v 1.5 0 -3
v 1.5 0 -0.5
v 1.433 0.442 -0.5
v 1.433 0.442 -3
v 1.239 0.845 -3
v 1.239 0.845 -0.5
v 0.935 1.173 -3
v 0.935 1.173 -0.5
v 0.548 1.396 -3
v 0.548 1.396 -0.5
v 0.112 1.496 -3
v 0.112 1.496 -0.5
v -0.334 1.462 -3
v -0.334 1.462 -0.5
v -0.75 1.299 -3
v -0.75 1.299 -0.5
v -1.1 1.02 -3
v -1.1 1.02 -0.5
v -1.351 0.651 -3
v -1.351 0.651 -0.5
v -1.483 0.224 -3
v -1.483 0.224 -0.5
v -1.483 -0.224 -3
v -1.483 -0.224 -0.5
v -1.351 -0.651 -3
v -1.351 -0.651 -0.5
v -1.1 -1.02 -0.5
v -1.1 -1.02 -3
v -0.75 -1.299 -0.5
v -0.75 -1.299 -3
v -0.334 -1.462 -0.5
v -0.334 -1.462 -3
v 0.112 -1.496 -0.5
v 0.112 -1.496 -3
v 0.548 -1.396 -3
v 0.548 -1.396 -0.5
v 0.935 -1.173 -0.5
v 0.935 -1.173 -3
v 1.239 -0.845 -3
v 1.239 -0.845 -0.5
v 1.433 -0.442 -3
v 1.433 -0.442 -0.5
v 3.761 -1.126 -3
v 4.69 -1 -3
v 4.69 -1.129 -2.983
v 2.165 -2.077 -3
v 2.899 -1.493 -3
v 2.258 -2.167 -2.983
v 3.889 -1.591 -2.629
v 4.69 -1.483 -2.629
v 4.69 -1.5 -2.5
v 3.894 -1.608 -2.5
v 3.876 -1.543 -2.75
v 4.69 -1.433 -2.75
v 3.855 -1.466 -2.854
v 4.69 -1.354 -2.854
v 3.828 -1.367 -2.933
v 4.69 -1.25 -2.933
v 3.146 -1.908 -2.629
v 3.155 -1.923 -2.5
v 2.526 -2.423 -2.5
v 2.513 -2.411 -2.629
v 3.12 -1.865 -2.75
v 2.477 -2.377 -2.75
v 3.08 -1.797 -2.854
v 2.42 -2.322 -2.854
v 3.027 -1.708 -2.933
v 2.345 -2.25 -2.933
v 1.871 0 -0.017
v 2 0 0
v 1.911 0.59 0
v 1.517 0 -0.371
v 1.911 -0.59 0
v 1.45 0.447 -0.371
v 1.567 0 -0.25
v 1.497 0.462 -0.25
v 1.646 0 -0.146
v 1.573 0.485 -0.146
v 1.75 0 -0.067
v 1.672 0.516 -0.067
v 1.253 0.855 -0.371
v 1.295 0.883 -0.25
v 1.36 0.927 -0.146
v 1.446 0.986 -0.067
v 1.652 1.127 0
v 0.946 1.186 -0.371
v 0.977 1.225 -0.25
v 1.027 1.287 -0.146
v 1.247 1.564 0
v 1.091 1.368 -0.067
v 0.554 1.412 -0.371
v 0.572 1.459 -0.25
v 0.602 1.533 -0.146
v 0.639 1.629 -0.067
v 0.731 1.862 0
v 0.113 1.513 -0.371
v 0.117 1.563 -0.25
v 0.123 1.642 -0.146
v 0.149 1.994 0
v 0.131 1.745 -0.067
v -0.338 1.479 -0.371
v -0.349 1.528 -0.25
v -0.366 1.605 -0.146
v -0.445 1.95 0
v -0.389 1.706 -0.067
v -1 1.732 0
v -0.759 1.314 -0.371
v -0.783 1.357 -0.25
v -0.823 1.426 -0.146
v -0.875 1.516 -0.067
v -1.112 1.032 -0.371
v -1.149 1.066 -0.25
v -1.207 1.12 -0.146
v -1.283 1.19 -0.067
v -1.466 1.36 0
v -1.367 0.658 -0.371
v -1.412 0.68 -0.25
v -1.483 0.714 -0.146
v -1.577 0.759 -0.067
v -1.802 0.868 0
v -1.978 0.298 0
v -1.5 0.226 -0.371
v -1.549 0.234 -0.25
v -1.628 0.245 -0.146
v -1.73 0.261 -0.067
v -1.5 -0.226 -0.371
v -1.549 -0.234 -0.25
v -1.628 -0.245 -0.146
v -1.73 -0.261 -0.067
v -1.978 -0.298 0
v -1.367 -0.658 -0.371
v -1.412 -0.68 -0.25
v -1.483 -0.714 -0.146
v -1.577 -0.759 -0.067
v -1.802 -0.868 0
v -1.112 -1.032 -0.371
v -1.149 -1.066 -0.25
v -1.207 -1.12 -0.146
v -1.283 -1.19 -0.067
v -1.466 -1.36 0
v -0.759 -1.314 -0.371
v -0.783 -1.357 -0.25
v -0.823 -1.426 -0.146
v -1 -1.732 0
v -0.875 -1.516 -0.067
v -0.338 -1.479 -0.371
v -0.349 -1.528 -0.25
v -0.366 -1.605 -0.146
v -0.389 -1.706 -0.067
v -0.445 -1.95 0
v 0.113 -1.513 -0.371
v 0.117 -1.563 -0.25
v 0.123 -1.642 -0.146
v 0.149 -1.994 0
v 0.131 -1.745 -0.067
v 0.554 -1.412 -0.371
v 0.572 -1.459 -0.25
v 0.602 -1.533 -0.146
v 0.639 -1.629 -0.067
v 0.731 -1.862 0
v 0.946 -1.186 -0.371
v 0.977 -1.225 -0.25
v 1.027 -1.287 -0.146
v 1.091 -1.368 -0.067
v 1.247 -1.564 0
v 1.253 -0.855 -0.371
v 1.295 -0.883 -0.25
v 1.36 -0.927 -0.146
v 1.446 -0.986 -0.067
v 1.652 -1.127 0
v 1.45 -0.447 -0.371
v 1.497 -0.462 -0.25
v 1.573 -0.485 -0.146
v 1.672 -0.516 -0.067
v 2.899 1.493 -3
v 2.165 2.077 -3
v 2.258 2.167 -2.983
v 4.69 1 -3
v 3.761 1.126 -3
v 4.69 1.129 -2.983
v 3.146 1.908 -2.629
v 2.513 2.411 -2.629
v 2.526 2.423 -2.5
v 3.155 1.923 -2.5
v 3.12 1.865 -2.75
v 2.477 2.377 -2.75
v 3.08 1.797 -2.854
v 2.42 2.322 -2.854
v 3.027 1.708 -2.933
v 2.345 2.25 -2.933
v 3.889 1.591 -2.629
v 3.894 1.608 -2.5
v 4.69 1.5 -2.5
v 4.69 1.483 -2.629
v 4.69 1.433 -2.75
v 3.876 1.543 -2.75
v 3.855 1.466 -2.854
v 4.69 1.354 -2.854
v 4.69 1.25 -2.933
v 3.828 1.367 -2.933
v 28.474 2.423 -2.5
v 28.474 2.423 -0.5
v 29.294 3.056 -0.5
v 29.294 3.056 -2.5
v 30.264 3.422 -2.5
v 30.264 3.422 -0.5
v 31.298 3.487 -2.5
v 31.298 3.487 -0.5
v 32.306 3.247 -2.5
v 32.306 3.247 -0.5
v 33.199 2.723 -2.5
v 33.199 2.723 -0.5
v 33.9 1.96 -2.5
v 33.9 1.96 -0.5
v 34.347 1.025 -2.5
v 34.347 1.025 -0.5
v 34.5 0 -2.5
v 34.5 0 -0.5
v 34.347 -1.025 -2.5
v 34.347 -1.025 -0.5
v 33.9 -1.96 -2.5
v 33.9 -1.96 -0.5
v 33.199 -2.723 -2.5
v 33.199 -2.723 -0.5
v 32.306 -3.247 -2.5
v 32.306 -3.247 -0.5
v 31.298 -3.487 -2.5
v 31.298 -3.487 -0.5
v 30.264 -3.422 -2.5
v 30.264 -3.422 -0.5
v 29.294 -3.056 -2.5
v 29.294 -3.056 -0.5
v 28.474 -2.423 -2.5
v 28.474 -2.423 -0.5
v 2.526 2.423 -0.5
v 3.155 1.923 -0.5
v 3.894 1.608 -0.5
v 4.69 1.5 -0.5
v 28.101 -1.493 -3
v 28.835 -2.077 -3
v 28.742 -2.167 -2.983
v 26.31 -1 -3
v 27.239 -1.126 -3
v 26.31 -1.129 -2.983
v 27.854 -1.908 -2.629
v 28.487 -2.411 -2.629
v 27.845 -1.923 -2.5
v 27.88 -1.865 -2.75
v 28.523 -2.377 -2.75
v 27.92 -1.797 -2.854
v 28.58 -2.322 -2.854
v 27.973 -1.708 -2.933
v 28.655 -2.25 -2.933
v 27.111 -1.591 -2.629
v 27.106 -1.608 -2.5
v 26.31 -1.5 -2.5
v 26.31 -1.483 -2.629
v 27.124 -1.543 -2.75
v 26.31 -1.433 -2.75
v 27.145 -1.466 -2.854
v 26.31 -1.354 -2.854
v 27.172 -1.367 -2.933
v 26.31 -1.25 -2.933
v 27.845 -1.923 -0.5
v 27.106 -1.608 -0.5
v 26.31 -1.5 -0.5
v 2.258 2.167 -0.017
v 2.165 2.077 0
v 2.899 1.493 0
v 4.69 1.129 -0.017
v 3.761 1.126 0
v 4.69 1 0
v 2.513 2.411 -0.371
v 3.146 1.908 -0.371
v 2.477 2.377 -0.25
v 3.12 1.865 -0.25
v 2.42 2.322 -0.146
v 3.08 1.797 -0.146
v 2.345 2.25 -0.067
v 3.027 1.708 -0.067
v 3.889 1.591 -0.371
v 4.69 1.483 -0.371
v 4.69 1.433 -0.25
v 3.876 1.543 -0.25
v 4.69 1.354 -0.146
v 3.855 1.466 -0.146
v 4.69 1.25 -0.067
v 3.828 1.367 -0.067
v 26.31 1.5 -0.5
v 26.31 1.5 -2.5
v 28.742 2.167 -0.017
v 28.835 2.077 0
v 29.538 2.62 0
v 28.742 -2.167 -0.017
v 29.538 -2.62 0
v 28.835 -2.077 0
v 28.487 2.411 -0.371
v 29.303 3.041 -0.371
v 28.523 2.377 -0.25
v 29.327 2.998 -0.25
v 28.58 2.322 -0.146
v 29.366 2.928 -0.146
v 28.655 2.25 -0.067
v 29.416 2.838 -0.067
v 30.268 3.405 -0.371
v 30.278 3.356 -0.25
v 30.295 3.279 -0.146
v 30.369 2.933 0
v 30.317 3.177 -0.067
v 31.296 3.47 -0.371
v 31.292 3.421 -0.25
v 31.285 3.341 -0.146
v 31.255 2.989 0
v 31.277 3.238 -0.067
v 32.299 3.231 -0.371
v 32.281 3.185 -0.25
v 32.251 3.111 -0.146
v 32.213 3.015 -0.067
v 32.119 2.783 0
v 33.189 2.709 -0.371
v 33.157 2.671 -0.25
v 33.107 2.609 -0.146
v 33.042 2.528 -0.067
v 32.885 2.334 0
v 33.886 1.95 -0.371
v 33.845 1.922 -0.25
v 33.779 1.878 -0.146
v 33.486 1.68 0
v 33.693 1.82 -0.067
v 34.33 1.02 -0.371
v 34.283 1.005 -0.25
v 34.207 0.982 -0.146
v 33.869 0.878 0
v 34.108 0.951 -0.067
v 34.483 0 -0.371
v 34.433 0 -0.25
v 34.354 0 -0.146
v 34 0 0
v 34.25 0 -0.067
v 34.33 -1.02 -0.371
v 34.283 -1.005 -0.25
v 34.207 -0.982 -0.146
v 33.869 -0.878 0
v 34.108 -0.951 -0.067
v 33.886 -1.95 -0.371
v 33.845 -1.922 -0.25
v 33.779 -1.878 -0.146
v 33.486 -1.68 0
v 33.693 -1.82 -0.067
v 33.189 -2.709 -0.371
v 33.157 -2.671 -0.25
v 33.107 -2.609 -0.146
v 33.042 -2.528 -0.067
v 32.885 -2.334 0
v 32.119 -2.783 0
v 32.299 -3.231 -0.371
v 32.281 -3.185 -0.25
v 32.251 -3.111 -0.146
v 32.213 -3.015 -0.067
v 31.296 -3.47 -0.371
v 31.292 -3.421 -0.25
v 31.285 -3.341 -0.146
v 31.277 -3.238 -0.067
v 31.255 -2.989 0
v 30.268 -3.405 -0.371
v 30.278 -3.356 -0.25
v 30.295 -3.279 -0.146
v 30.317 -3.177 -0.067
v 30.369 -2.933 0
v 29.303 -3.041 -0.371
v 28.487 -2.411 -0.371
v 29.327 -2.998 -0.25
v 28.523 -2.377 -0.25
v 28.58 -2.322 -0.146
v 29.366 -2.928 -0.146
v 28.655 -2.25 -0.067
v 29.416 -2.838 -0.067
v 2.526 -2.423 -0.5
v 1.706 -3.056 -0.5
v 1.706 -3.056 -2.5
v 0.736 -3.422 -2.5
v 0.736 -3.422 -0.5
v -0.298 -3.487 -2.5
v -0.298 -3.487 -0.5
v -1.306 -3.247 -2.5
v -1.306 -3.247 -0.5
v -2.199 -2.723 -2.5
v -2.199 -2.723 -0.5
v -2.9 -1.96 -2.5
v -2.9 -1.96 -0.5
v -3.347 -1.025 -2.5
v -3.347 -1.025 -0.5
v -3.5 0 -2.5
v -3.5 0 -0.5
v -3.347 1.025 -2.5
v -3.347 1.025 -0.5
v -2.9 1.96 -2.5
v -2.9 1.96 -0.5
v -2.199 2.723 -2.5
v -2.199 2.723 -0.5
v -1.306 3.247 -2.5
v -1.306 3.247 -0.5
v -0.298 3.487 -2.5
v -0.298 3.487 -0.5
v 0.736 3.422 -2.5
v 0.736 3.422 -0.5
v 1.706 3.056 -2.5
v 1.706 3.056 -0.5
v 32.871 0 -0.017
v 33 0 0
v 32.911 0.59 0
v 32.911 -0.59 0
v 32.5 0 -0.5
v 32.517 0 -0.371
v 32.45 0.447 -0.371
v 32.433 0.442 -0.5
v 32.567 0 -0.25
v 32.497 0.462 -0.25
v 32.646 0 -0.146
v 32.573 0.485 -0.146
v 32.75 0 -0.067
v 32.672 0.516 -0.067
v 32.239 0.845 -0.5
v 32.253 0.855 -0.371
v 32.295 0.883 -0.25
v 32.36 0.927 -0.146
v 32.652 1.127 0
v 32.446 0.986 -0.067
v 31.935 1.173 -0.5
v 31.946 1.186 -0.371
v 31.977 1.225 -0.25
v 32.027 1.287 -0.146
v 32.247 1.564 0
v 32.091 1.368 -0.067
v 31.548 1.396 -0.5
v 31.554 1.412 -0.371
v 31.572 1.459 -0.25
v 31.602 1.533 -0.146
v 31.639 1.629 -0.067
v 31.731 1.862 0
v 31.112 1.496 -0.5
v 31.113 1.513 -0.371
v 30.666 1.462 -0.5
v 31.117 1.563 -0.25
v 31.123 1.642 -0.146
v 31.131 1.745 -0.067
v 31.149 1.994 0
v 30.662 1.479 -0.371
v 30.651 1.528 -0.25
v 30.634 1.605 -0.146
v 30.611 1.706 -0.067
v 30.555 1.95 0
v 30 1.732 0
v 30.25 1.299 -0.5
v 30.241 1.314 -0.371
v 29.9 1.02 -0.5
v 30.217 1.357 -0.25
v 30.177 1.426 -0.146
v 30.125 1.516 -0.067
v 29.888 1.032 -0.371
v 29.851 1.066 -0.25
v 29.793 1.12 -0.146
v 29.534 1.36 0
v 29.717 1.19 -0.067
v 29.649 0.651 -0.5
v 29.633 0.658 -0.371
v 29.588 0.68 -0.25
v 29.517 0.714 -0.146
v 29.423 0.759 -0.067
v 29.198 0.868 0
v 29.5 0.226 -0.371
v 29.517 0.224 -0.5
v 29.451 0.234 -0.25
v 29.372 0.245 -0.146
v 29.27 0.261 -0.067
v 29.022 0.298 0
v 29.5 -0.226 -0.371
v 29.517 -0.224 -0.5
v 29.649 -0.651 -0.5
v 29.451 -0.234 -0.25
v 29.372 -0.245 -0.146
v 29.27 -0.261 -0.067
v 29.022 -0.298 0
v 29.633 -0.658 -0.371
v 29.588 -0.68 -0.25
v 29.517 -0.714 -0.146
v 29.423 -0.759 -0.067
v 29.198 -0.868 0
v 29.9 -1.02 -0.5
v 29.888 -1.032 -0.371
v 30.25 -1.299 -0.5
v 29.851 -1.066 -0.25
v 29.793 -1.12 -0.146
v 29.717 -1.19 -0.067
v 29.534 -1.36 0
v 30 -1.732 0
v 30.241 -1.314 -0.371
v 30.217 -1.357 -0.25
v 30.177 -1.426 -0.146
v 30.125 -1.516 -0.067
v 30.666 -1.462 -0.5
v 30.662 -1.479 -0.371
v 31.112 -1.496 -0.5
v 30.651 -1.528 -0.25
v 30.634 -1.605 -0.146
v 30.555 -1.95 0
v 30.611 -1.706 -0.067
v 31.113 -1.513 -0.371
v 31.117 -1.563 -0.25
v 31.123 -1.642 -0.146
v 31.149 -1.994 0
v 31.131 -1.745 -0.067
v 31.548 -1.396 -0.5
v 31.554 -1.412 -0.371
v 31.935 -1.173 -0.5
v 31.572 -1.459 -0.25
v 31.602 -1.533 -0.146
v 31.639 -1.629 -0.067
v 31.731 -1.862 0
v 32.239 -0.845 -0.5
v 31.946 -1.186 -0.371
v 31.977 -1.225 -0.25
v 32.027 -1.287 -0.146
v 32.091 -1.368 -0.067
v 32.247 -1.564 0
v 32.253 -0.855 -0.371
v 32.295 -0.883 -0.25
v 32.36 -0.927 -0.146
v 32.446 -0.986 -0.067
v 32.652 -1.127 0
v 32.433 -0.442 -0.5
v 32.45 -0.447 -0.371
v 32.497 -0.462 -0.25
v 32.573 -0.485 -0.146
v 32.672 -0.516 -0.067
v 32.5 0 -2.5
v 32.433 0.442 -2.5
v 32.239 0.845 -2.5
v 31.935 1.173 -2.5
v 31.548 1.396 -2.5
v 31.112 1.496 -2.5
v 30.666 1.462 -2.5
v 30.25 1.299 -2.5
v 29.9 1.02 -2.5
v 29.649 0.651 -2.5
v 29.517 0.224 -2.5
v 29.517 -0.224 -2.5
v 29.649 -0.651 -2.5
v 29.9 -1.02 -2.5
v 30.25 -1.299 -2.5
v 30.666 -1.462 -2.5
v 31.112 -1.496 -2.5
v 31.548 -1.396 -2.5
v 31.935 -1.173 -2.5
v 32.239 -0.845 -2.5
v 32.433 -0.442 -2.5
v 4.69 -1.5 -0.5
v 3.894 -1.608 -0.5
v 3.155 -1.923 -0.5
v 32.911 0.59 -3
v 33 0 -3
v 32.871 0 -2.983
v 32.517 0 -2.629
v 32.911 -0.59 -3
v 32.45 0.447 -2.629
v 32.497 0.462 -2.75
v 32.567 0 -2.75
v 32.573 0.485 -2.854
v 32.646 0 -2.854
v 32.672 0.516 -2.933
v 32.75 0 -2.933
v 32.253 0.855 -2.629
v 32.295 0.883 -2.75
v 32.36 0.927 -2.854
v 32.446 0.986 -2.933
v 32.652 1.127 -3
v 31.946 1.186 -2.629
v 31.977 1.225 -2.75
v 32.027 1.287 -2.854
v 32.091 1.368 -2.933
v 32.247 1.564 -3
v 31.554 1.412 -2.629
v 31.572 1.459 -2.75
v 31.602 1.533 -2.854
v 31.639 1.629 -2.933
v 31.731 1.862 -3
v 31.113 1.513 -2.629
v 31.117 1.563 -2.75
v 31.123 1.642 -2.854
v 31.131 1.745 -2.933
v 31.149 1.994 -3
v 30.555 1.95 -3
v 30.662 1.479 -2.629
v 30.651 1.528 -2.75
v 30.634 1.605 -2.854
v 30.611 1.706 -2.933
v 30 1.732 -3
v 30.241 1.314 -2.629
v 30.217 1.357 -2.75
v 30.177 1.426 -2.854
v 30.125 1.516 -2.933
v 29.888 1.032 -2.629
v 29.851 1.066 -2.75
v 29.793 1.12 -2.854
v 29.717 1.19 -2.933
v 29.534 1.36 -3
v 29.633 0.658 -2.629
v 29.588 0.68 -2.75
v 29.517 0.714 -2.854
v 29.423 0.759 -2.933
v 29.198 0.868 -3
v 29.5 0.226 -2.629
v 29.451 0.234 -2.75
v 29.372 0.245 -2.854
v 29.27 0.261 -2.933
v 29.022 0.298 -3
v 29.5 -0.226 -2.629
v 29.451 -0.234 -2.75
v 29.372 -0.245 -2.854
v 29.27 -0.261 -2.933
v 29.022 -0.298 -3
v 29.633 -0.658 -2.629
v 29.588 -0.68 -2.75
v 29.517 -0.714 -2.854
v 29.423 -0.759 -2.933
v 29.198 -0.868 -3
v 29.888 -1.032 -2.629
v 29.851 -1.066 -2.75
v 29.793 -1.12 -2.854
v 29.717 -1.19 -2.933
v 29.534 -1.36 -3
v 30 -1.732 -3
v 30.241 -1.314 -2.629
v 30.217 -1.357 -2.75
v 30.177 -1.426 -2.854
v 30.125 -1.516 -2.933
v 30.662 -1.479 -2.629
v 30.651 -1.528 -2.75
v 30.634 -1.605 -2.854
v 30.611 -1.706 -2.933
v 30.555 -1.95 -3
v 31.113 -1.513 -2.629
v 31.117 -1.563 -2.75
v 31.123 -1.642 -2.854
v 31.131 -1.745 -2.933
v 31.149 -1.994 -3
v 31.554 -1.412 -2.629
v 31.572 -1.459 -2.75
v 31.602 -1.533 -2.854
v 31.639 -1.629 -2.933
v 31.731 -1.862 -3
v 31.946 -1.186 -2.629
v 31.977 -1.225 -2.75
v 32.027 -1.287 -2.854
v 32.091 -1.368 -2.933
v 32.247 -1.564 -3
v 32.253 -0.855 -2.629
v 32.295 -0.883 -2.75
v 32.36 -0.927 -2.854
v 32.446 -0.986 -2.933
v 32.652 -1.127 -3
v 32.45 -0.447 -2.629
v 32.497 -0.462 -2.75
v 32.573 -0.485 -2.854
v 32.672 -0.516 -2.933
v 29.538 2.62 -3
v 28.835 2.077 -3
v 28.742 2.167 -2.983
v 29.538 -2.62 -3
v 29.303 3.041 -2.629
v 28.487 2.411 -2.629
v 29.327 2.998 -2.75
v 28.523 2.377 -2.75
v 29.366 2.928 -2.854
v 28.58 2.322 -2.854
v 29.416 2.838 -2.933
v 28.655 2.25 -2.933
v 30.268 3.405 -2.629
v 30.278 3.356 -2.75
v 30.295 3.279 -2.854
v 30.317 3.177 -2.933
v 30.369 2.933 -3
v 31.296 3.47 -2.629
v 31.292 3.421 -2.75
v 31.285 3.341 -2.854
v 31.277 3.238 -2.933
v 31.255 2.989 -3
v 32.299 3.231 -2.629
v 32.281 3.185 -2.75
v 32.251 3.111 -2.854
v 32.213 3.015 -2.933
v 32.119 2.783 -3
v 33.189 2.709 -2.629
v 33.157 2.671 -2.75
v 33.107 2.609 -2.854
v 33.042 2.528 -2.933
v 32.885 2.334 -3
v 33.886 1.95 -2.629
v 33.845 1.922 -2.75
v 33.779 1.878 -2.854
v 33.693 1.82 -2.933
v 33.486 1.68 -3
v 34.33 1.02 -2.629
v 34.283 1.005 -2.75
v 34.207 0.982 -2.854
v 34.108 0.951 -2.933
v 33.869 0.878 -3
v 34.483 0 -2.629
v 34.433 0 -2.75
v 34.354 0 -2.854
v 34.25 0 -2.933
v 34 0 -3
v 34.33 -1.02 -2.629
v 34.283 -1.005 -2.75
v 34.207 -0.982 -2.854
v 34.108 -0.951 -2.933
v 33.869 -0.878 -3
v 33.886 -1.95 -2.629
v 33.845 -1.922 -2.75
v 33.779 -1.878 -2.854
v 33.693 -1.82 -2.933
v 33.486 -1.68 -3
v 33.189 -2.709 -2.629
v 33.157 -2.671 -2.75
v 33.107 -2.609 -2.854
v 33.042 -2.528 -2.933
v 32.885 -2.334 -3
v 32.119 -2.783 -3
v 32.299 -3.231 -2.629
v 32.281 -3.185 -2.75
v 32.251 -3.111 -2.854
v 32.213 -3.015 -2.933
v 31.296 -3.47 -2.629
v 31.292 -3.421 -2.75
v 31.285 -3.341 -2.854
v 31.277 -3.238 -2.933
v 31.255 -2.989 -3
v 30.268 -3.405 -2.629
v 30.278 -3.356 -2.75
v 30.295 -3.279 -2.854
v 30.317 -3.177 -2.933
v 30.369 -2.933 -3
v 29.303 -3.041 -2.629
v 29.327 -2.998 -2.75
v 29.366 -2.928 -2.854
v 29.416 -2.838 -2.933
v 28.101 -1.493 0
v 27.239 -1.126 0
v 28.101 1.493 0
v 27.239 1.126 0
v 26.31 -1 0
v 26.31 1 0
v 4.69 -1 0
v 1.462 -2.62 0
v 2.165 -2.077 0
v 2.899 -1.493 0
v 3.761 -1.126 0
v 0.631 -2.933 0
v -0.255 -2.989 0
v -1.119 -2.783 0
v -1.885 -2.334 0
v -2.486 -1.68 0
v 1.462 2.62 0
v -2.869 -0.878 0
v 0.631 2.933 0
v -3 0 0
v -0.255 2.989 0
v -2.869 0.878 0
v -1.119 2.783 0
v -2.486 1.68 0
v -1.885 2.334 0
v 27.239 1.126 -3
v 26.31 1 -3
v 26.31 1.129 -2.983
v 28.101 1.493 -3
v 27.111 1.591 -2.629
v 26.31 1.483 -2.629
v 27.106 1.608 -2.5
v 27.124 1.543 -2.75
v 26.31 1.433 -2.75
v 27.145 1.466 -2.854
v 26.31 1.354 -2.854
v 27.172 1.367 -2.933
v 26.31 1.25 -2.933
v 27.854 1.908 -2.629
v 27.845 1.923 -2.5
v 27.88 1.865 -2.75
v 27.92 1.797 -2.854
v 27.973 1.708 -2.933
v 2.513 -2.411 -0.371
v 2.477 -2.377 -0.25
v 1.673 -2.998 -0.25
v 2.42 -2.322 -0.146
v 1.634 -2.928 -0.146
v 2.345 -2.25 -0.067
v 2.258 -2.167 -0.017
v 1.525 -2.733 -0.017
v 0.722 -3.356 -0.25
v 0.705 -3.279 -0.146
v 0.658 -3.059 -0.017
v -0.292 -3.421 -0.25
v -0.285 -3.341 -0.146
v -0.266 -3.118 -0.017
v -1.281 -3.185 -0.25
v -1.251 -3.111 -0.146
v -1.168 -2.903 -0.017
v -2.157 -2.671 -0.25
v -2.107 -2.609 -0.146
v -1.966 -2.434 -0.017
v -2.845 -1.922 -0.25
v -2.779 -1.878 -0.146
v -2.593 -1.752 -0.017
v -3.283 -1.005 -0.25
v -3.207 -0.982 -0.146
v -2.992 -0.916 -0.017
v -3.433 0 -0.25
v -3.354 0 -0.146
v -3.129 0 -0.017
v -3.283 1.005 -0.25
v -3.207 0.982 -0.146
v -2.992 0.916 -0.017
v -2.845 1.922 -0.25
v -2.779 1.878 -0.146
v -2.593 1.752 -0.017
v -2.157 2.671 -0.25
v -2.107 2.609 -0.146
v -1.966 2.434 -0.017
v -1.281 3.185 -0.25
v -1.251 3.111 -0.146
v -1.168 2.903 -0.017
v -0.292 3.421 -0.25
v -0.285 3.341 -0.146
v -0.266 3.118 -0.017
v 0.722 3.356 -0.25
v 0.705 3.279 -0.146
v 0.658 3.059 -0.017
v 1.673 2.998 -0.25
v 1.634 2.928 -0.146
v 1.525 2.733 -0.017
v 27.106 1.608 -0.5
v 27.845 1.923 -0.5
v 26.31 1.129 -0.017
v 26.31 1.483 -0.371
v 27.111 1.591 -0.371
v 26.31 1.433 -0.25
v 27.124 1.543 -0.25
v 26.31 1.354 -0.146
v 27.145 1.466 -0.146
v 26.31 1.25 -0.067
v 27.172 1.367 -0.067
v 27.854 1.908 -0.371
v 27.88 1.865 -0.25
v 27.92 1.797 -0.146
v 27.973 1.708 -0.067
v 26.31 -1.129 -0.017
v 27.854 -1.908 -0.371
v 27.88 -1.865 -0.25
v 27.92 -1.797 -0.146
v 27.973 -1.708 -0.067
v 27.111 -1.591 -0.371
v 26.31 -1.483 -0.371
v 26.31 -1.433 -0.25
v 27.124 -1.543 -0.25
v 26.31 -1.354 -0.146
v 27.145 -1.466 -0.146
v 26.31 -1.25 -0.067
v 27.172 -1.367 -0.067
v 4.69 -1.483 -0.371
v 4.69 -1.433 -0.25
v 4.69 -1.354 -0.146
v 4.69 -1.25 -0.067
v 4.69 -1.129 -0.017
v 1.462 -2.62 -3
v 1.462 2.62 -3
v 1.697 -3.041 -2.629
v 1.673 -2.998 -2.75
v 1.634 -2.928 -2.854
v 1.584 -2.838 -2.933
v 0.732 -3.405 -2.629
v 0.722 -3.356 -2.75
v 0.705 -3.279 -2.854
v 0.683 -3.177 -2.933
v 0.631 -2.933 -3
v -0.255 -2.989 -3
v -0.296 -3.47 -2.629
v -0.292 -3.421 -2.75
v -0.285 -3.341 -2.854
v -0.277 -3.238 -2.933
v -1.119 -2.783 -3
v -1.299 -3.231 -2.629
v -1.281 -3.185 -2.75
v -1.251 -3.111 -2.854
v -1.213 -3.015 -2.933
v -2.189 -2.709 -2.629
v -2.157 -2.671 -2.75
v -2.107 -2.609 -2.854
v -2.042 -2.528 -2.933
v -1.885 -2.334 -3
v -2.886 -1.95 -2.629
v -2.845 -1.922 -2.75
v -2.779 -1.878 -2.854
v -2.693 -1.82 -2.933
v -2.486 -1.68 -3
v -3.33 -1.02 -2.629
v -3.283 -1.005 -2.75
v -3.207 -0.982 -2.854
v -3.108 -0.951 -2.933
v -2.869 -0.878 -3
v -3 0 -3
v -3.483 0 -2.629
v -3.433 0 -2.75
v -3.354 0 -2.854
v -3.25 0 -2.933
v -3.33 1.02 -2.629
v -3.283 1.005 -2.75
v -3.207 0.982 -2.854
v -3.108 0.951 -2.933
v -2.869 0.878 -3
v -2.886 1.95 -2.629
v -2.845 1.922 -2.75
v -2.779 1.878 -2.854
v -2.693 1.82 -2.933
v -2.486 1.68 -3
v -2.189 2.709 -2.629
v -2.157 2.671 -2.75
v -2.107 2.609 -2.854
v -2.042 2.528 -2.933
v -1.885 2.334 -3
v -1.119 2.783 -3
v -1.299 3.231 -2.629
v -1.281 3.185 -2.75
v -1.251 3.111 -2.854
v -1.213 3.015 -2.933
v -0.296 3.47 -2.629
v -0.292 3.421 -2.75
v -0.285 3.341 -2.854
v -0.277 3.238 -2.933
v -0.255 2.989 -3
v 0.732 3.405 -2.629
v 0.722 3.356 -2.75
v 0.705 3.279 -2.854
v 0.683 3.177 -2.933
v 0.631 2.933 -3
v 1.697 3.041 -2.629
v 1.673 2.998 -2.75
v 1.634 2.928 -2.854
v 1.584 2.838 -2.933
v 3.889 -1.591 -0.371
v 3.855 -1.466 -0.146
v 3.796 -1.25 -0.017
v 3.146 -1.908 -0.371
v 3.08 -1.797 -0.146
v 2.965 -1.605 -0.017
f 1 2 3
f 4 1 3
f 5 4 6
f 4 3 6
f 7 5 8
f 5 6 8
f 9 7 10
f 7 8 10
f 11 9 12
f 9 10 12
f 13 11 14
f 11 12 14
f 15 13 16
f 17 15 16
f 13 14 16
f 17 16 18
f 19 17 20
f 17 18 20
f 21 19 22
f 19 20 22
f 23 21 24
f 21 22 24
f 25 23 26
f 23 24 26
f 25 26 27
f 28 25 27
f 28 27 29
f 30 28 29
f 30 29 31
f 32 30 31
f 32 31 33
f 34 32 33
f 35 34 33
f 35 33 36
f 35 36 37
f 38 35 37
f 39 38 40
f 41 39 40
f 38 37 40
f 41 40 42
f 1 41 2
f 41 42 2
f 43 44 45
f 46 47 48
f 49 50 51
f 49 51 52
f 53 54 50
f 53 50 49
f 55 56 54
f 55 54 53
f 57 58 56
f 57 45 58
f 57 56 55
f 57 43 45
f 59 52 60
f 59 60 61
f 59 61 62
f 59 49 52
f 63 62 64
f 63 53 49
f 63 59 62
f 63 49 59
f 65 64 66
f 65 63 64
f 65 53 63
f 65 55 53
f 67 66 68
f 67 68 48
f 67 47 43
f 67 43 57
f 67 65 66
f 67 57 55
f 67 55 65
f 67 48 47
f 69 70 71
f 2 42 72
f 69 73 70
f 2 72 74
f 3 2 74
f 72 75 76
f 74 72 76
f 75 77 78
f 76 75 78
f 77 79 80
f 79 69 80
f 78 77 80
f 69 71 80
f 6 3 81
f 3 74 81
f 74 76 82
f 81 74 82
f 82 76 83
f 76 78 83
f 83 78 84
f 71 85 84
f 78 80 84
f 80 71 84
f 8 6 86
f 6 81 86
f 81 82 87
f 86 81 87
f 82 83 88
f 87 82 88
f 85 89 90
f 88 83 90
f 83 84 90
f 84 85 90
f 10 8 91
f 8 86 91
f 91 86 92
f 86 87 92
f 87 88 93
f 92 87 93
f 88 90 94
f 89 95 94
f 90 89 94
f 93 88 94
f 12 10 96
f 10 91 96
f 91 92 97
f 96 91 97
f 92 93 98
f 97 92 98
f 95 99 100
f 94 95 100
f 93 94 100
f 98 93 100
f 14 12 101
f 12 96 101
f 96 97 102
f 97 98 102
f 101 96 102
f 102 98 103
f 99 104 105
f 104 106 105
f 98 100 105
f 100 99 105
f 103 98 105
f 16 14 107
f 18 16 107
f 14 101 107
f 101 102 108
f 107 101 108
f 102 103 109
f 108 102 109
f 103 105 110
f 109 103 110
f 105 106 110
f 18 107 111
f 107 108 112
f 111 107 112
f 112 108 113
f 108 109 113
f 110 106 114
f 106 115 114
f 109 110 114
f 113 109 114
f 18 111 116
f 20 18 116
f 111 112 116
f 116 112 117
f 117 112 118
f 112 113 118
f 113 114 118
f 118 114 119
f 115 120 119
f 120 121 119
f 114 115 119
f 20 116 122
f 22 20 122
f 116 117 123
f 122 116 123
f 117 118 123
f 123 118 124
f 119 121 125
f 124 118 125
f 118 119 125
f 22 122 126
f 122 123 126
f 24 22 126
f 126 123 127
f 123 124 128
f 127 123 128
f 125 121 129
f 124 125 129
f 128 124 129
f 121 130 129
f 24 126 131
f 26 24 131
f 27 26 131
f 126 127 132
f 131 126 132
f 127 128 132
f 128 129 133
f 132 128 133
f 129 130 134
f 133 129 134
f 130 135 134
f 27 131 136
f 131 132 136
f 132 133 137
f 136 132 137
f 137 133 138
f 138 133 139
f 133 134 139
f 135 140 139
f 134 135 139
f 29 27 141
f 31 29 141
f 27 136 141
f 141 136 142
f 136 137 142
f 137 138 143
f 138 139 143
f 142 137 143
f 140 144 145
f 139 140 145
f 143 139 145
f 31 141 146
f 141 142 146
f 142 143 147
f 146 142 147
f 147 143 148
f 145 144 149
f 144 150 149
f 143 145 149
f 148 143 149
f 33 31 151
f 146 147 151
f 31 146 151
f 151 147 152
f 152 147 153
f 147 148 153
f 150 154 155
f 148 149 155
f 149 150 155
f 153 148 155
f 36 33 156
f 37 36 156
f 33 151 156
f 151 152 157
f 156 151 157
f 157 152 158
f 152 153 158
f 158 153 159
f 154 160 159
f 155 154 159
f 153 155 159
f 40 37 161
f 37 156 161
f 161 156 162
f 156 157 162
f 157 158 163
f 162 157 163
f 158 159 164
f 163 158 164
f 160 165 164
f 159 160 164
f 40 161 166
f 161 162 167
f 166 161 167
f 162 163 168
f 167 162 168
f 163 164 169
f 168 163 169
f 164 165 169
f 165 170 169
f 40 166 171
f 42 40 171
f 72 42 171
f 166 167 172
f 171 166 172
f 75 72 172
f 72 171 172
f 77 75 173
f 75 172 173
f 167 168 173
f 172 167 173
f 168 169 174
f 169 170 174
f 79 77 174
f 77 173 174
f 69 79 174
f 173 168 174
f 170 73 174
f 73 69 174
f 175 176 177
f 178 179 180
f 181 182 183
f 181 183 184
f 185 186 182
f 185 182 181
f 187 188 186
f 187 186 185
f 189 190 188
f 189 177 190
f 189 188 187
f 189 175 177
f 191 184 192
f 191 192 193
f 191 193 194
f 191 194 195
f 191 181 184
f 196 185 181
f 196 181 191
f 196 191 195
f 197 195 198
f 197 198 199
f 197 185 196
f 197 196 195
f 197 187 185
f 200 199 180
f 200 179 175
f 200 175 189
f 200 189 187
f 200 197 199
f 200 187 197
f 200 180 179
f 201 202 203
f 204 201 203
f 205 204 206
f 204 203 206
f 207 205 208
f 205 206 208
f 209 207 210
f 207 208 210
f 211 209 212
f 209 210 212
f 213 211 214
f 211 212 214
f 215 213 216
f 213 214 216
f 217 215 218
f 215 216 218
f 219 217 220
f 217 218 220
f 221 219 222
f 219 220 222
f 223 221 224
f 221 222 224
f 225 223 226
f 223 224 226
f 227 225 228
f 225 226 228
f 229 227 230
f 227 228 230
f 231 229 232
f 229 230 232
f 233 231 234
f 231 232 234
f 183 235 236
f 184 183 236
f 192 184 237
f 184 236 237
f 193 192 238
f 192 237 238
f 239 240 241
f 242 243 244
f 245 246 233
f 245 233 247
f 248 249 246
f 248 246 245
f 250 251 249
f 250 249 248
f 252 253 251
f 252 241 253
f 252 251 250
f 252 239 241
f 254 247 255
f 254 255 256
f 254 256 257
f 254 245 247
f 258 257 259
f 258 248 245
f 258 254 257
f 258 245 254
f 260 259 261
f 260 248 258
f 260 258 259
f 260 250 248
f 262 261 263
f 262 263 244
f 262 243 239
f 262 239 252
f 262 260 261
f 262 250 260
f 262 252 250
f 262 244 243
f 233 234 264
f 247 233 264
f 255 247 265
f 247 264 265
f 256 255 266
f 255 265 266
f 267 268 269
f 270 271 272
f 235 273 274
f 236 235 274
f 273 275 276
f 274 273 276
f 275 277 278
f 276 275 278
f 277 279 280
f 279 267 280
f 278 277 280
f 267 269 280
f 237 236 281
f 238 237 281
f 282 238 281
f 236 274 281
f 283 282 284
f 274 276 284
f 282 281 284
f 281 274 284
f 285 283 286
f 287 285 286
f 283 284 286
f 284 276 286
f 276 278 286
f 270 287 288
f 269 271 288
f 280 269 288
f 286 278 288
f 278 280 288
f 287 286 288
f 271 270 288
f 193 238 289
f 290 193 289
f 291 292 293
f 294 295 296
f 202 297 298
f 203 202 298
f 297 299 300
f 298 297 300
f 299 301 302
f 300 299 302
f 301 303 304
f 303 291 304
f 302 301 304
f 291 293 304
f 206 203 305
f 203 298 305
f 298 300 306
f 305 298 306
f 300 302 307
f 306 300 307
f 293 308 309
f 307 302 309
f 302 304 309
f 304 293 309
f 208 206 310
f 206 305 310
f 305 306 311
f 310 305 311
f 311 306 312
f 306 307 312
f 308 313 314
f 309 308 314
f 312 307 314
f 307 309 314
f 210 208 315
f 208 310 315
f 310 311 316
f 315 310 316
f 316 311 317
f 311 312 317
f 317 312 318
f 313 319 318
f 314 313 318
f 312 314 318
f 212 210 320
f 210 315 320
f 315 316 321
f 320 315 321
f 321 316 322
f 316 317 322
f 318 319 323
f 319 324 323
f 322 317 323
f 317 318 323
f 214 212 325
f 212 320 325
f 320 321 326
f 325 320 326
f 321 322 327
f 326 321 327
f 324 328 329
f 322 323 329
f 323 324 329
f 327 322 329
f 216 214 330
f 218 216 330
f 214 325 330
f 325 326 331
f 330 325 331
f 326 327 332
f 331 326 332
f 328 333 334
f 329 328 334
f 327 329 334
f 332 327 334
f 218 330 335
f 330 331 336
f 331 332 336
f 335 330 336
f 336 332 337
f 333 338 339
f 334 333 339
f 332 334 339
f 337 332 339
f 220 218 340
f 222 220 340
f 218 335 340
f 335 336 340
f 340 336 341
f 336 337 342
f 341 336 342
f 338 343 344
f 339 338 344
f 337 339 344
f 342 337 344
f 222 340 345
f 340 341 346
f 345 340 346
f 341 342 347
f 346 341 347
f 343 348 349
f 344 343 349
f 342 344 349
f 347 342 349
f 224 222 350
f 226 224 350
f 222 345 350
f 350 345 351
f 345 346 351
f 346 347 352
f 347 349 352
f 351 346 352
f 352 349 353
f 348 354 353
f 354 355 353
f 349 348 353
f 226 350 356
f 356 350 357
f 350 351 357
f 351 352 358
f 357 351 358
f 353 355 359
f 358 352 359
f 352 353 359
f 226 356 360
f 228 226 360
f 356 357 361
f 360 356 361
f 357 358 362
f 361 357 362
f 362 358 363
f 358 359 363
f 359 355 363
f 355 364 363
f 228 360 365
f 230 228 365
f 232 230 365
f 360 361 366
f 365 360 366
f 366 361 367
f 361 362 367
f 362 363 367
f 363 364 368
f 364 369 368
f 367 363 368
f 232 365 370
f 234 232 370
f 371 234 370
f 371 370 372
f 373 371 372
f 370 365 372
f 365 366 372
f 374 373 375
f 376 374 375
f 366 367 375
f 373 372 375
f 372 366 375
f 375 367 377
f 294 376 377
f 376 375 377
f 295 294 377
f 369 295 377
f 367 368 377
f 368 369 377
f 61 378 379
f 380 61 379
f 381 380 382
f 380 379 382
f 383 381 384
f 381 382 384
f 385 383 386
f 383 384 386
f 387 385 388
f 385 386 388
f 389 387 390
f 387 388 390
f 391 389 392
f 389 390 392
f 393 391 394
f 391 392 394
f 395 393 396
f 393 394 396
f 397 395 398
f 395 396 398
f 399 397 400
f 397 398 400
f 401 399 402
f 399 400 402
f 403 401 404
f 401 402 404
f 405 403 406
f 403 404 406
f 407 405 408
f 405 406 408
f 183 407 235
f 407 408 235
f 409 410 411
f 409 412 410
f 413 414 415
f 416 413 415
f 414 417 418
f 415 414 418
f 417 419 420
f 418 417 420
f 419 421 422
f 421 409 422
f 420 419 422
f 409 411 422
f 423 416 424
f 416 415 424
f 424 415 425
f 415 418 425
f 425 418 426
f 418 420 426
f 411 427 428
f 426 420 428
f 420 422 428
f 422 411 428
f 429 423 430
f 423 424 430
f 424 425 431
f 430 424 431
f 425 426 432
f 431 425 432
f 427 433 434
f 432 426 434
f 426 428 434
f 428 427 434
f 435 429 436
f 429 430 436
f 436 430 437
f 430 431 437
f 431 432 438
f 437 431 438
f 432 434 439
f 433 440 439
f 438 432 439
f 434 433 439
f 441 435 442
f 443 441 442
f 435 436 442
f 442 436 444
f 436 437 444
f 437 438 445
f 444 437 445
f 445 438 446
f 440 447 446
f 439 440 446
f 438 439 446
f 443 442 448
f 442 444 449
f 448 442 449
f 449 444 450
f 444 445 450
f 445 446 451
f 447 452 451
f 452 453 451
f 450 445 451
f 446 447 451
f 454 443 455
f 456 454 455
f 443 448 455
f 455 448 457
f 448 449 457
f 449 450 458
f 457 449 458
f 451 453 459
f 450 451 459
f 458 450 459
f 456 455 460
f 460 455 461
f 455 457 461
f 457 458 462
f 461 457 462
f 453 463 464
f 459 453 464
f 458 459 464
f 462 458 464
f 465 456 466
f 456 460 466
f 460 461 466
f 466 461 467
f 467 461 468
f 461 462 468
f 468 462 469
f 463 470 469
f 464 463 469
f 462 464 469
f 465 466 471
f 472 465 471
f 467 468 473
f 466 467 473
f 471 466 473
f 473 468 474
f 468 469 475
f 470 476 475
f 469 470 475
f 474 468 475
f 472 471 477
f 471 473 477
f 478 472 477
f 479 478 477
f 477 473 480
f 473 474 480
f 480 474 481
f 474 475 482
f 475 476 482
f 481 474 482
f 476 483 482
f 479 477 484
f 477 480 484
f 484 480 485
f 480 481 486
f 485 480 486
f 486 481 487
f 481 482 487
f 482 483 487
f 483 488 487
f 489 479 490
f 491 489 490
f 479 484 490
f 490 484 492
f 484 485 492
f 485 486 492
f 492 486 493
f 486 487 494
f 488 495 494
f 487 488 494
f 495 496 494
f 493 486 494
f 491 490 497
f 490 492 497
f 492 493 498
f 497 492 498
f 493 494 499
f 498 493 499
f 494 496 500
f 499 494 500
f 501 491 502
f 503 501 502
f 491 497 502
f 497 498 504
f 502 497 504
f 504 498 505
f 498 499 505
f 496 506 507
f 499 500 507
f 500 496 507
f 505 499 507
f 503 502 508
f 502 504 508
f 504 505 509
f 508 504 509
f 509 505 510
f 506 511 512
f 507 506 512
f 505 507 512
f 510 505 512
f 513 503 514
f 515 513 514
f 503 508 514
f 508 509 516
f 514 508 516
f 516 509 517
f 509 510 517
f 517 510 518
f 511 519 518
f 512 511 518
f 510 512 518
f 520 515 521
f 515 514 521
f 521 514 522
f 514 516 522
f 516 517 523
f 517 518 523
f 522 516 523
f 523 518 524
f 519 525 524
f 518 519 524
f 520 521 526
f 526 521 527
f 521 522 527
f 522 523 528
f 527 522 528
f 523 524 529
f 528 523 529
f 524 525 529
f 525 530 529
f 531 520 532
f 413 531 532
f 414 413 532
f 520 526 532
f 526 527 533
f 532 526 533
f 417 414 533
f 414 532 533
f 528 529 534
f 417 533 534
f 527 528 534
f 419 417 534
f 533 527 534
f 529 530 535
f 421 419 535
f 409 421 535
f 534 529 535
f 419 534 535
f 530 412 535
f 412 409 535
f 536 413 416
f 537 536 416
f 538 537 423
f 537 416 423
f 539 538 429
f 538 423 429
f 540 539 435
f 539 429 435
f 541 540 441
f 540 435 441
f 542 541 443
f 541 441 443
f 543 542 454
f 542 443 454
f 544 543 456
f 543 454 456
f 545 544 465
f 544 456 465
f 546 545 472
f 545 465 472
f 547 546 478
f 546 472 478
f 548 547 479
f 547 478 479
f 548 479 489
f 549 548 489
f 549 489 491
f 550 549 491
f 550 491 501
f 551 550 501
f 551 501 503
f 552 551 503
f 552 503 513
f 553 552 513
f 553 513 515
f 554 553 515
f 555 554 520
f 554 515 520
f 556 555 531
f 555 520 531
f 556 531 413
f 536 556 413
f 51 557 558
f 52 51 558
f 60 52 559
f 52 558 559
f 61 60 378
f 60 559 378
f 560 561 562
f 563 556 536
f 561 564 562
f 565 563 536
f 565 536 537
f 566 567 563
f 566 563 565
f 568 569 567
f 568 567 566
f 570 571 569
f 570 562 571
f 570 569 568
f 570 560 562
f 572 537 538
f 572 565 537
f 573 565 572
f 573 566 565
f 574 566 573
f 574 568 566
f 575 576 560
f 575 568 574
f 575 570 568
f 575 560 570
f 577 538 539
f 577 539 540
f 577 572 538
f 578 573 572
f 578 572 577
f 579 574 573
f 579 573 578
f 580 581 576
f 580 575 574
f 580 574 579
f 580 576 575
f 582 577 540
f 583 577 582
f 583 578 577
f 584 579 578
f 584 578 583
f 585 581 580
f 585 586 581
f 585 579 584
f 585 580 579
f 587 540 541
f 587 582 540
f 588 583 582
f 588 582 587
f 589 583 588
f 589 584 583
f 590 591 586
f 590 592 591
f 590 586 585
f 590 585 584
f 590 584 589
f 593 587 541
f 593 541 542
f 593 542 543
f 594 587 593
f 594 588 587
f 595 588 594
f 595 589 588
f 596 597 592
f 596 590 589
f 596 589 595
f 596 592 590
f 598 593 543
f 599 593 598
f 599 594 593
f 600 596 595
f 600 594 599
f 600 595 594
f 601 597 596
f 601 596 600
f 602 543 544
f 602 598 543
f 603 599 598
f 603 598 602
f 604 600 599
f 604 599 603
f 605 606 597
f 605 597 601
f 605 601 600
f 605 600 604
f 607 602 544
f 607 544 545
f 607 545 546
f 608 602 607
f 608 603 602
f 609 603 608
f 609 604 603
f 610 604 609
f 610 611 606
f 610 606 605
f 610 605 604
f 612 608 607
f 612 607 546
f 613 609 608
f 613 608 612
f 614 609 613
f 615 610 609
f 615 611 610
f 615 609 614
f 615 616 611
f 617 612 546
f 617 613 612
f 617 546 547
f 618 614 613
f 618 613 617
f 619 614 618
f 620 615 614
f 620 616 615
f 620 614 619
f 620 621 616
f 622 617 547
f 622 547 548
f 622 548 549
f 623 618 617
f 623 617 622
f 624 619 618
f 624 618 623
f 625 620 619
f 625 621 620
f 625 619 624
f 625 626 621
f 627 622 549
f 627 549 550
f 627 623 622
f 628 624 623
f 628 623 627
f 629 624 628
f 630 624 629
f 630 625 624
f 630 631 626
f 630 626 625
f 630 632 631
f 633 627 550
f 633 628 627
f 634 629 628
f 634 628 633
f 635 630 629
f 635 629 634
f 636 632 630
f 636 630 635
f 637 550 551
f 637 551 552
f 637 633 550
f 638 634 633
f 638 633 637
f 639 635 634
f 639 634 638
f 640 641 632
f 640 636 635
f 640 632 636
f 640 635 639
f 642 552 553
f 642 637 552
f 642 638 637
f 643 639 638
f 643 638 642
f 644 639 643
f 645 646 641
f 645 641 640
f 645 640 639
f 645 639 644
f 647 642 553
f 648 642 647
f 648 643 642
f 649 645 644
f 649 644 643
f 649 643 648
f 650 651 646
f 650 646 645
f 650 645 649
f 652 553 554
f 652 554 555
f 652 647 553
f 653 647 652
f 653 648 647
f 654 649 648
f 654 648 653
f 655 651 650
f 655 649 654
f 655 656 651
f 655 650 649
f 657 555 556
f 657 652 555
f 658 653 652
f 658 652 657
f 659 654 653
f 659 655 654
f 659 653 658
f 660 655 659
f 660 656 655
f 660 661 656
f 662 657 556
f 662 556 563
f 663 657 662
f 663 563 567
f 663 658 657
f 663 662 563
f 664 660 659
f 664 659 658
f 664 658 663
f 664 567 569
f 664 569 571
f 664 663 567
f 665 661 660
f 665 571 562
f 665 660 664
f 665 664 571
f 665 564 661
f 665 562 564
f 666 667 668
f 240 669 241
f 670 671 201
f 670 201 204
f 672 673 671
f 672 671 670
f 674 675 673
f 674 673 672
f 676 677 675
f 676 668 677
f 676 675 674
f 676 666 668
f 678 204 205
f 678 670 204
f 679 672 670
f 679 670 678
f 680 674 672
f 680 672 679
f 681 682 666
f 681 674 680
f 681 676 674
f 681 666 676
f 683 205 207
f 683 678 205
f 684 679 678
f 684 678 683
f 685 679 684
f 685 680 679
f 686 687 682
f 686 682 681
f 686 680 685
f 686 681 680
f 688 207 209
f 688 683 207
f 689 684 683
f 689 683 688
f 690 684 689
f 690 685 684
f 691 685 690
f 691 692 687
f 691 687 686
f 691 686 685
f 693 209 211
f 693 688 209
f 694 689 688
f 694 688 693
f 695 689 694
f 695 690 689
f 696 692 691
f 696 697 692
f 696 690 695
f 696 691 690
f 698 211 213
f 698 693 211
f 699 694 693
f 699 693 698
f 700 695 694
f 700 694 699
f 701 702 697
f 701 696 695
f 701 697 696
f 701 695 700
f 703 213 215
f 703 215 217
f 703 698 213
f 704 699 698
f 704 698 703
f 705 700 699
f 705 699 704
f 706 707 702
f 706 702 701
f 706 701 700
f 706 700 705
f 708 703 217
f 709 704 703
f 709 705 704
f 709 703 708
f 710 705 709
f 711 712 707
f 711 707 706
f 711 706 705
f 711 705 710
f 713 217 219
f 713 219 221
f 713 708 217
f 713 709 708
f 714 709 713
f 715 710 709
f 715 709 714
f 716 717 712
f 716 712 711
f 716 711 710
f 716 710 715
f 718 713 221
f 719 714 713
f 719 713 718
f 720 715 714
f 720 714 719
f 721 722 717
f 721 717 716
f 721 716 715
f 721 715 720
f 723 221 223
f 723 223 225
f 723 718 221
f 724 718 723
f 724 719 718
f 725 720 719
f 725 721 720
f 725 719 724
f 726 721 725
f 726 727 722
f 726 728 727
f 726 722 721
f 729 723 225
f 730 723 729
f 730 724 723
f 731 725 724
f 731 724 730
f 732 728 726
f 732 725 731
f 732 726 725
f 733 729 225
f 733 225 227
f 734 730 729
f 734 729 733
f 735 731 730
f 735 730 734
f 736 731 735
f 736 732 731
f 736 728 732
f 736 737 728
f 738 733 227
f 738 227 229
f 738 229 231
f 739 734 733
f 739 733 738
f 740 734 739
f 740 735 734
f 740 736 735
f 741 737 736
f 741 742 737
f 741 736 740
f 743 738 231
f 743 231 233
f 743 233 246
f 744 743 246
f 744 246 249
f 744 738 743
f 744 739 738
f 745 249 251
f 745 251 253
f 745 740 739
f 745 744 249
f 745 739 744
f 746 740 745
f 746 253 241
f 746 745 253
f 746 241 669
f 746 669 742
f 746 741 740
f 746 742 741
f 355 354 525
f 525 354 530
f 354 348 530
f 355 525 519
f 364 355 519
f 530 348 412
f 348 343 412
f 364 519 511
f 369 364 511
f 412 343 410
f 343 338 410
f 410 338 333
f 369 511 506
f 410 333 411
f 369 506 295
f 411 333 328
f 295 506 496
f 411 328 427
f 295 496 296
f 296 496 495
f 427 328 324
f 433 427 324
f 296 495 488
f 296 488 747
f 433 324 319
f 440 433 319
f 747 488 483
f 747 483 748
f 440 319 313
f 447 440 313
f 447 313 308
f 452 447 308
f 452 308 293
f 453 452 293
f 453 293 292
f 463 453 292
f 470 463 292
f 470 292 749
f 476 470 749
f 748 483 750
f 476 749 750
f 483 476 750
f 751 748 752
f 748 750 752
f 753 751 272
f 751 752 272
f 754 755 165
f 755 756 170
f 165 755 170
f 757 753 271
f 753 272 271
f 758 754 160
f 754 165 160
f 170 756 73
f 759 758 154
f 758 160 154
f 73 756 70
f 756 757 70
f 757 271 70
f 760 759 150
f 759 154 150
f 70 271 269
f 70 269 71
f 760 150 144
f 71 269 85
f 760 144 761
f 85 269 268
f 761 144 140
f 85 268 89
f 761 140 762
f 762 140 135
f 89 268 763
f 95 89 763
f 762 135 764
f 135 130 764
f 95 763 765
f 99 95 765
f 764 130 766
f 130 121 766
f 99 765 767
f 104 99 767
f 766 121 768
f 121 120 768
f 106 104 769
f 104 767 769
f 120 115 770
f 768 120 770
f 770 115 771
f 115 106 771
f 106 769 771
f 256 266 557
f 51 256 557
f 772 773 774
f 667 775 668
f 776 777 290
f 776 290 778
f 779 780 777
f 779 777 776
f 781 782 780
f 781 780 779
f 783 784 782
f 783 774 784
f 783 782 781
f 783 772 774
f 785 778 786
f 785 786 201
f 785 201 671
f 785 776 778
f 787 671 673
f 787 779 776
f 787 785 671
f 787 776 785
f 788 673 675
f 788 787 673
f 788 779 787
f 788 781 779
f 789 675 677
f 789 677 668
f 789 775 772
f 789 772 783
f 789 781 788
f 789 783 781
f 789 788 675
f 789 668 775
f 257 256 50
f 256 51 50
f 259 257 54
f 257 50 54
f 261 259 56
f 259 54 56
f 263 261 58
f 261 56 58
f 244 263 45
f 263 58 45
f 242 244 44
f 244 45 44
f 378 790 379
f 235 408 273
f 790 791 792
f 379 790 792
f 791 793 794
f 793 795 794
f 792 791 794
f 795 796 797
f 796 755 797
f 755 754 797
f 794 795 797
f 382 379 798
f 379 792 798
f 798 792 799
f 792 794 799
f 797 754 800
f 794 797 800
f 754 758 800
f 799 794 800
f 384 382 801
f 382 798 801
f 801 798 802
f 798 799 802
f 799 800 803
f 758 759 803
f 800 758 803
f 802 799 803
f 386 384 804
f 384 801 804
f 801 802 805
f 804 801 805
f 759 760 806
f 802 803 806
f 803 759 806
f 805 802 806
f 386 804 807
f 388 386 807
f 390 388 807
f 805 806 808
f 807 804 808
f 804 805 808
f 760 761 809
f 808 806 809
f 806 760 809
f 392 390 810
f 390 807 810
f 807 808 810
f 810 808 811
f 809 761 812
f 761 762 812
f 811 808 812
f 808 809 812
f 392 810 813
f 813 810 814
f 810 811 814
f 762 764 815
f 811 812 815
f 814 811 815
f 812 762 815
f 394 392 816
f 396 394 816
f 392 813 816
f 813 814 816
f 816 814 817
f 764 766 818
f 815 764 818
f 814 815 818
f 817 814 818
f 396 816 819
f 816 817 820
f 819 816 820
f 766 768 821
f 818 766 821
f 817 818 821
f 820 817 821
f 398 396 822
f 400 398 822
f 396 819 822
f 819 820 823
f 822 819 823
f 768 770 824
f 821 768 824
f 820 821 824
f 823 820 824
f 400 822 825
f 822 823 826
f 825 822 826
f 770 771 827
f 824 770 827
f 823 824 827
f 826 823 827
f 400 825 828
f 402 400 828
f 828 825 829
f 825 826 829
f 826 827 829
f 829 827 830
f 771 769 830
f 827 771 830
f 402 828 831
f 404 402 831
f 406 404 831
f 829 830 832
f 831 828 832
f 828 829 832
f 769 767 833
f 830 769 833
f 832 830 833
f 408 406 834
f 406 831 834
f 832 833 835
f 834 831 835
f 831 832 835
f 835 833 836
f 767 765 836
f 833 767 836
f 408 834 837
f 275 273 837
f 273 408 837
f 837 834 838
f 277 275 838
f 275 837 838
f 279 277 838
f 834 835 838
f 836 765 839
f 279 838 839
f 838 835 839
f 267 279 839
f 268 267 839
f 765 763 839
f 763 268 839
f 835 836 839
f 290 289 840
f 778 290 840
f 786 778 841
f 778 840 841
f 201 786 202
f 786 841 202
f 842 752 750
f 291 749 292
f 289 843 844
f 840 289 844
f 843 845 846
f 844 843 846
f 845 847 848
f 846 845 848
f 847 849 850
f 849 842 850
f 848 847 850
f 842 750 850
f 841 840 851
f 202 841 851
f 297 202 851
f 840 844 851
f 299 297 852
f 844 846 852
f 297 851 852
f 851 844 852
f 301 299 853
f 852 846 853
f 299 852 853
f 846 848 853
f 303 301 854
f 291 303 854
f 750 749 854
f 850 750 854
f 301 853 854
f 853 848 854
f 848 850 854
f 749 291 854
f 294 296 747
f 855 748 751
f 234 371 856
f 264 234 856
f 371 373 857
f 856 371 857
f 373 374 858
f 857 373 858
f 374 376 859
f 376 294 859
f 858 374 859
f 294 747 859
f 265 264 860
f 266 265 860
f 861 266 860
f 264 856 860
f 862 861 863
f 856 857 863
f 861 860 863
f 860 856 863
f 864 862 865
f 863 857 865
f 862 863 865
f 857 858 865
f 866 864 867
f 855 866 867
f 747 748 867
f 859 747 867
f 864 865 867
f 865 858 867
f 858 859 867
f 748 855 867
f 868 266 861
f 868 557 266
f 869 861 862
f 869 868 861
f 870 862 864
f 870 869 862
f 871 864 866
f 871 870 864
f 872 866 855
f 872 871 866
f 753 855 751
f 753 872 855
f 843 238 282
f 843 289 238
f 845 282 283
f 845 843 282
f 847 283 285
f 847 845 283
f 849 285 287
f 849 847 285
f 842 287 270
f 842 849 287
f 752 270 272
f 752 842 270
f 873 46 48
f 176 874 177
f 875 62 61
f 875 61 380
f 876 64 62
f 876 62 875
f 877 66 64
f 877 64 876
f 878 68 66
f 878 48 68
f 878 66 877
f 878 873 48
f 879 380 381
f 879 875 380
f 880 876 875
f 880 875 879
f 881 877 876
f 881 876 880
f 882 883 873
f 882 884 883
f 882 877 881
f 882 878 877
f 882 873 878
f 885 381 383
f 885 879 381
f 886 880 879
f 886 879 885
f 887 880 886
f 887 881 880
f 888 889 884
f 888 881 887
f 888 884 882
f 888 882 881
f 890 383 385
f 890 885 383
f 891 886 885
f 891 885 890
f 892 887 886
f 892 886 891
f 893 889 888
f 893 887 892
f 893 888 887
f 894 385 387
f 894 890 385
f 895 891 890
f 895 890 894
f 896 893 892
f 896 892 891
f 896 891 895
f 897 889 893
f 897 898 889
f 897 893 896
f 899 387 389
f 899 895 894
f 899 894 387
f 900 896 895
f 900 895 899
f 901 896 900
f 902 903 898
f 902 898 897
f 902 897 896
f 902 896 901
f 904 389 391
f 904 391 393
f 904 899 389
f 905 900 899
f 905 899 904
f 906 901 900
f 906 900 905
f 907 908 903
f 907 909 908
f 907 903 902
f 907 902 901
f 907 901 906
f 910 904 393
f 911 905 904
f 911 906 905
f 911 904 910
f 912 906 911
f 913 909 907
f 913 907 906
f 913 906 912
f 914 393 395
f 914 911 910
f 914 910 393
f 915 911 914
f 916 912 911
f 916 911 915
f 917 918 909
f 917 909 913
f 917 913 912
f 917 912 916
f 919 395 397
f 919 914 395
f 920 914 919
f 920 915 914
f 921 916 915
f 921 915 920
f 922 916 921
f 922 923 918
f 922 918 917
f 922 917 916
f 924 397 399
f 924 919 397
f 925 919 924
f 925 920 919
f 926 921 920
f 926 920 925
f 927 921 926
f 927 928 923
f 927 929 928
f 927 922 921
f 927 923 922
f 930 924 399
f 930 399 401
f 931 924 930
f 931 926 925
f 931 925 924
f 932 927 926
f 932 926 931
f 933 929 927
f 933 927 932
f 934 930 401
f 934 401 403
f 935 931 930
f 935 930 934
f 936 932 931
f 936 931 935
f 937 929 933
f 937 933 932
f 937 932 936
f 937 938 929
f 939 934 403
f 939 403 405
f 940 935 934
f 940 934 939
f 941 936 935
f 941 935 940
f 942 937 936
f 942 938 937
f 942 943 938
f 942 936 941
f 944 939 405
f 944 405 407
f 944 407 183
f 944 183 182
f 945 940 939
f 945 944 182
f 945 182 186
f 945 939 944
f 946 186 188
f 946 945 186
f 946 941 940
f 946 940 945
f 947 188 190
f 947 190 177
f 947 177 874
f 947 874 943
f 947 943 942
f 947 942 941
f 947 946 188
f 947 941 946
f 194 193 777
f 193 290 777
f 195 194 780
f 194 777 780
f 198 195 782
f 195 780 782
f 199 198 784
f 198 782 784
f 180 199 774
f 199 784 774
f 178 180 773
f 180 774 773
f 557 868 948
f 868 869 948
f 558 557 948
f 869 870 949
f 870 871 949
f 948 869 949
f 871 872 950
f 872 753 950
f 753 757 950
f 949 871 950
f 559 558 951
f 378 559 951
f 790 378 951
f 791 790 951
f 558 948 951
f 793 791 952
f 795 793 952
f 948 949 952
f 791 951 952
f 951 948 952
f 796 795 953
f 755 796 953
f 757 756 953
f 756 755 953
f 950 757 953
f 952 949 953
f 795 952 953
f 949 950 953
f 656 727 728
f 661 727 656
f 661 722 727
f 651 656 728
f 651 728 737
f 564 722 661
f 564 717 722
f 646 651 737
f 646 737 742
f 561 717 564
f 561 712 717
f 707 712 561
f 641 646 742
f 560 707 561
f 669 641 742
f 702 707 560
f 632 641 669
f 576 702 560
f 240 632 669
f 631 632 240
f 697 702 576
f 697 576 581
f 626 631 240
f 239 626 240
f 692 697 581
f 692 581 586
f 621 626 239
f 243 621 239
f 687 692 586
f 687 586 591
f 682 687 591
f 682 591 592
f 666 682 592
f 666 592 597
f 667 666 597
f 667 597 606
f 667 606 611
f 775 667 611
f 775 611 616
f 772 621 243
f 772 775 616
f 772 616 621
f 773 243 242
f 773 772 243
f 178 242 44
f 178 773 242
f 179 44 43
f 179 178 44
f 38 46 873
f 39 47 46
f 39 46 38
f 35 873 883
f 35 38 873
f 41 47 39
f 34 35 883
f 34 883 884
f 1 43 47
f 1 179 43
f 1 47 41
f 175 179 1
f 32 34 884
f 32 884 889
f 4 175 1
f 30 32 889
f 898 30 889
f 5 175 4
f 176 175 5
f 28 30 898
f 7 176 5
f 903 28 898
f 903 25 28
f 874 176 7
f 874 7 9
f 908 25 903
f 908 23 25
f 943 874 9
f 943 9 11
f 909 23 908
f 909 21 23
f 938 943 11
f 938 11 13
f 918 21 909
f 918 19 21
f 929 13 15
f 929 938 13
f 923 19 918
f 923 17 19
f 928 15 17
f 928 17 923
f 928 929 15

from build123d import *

# Parameters (mm, degrees)
SKETCH1_R           = 1.5
BOSS_EXTRUDE1_DEPTH = 3
FILLET1_R           = 0.5


with BuildPart() as part:
    # Sketch1 → Boss-Extrude1 (new body)
    with BuildSketch(Plane.XY):
        with BuildLine():
            Line((4.69041576, 1.5), (26.30958424, 1.5))
            ThreePointArc((26.30958424, 1.5), (27.486281051, 1.740401367), (28.474391514, 2.423076923))
            ThreePointArc((28.474391514, 2.423076923), (34.5, 0), (28.474391514, -2.423076923))
            ThreePointArc((28.474391514, -2.423076923), (27.486281051, -1.740401367), (26.30958424, -1.5))
            Line((26.30958424, -1.5), (4.69041576, -1.5))
            ThreePointArc((4.69041576, -1.5), (3.513718949, -1.740401367), (2.525608486, -2.423076923))
            ThreePointArc((2.525608486, -2.423076923), (-3.5, 0), (2.525608486, 2.423076923))
            ThreePointArc((2.525608486, 2.423076923), (3.513718949, 1.740401367), (4.69041576, 1.5))
        make_face()
        Circle(SKETCH1_R, mode=Mode.SUBTRACT)
        with Locations((31, 0)):
            Circle(SKETCH1_R, mode=Mode.SUBTRACT)
    extrude(amount=-BOSS_EXTRUDE1_DEPTH)

    # Fillet1
    fillet1_edges = [part.edges().sort_by_distance(p)[0] for p in [
        (-3.5, 0, 0),
        (3.513718949, 1.740401367, 0),
        (15.5, 1.5, 0),
        (27.486281051, 1.740401367, 0),
        (3.513718949, 1.740401367, -3),
        (-3.5, 0, -3),
        (3.513718949, -1.740401367, -3),
        (-1.5, 0, 0),
        (15.5, -1.5, -3),
        (29.5, 0, -3),
        (29.5, 0, 0),
        (27.486281051, -1.740401367, -3),
        (34.5, 0, -3),
        (27.486281051, 1.740401367, -3),
        (34.5, 0, 0),
        (15.5, 1.5, -3),
        (27.486281051, -1.740401367, 0),
        (15.5, -1.5, 0),
        (3.513718949, -1.740401367, 0),
    ]]
    fillet(fillet1_edges, radius=FILLET1_R)


solid = part.part
